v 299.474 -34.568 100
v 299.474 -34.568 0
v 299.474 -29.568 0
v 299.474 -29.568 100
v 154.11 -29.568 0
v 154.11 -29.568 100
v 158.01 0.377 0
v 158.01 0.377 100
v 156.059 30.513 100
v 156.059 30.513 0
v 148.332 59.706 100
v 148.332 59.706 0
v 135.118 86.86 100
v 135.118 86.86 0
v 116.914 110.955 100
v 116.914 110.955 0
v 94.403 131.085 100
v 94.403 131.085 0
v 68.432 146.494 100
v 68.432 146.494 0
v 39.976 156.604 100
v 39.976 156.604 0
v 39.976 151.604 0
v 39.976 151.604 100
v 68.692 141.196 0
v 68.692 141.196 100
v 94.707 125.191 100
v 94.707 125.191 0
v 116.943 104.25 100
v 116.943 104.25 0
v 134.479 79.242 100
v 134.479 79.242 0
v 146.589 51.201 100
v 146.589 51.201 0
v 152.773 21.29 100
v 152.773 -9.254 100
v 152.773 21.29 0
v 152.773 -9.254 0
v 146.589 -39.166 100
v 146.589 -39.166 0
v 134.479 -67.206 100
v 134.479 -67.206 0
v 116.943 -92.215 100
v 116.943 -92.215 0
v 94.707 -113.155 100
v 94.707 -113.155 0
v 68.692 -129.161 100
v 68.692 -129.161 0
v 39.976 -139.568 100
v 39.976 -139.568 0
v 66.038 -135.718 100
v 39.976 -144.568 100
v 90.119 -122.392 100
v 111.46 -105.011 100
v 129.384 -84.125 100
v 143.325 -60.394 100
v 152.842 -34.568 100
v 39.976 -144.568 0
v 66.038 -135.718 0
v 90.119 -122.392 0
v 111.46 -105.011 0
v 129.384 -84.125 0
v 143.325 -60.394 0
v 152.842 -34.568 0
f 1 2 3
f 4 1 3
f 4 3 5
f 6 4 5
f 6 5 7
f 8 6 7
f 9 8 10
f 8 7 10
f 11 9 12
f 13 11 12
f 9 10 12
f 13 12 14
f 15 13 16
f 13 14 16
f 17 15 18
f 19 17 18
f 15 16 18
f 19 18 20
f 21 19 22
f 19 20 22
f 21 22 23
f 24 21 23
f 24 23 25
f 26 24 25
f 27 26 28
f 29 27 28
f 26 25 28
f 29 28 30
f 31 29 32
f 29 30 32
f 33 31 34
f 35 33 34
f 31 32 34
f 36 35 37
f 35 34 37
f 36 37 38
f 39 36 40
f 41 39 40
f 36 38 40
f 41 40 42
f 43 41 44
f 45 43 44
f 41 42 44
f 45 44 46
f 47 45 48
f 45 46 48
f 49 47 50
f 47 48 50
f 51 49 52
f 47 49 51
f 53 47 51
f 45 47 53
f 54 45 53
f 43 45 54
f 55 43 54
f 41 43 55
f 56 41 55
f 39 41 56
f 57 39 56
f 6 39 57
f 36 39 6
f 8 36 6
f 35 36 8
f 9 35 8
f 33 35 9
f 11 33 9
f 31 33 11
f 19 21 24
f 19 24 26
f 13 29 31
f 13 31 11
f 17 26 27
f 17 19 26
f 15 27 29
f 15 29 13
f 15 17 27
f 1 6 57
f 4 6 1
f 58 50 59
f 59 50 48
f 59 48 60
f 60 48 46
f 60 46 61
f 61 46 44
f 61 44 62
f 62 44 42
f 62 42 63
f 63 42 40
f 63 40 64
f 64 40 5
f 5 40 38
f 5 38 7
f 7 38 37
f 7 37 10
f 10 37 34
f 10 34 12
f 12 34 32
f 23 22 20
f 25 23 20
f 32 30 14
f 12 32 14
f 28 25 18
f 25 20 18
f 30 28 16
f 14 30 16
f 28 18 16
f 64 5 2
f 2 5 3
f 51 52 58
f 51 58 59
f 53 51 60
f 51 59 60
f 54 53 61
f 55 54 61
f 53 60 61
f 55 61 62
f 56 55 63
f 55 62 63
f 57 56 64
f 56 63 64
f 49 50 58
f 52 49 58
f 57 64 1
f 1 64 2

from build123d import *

# Parameters (mm, degrees)
F1_DEPTH = 100


with BuildPart() as f1:
    # F0 (on Top) → F1 (new body)
    with BuildSketch(Plane.XY):
        with BuildLine():
            Line((152.842064, -34.568323), (299.473815, -34.568323))
            Line((299.473815, -34.568323), (299.473815, -29.568323))
            Line((299.473815, -29.568323), (154.109696, -29.568323))
            ThreePointArc((154.109696, -29.568323), (135.118218, 86.86006), (39.976107, 156.604046))
            Line((39.976107, 156.604046), (39.976107, 151.604046))
            ThreePointArc((39.976107, 151.604046), (153.551571, 6.017862), (39.976107, -139.568323))
            Line((39.976107, -139.568323), (39.976107, -144.568323))
            ThreePointArc((39.976107, -144.568323), (111.459598, -105.010963), (152.842064, -34.568323))
        make_face()
    extrude(amount=F1_DEPTH)


solid = f1.part
